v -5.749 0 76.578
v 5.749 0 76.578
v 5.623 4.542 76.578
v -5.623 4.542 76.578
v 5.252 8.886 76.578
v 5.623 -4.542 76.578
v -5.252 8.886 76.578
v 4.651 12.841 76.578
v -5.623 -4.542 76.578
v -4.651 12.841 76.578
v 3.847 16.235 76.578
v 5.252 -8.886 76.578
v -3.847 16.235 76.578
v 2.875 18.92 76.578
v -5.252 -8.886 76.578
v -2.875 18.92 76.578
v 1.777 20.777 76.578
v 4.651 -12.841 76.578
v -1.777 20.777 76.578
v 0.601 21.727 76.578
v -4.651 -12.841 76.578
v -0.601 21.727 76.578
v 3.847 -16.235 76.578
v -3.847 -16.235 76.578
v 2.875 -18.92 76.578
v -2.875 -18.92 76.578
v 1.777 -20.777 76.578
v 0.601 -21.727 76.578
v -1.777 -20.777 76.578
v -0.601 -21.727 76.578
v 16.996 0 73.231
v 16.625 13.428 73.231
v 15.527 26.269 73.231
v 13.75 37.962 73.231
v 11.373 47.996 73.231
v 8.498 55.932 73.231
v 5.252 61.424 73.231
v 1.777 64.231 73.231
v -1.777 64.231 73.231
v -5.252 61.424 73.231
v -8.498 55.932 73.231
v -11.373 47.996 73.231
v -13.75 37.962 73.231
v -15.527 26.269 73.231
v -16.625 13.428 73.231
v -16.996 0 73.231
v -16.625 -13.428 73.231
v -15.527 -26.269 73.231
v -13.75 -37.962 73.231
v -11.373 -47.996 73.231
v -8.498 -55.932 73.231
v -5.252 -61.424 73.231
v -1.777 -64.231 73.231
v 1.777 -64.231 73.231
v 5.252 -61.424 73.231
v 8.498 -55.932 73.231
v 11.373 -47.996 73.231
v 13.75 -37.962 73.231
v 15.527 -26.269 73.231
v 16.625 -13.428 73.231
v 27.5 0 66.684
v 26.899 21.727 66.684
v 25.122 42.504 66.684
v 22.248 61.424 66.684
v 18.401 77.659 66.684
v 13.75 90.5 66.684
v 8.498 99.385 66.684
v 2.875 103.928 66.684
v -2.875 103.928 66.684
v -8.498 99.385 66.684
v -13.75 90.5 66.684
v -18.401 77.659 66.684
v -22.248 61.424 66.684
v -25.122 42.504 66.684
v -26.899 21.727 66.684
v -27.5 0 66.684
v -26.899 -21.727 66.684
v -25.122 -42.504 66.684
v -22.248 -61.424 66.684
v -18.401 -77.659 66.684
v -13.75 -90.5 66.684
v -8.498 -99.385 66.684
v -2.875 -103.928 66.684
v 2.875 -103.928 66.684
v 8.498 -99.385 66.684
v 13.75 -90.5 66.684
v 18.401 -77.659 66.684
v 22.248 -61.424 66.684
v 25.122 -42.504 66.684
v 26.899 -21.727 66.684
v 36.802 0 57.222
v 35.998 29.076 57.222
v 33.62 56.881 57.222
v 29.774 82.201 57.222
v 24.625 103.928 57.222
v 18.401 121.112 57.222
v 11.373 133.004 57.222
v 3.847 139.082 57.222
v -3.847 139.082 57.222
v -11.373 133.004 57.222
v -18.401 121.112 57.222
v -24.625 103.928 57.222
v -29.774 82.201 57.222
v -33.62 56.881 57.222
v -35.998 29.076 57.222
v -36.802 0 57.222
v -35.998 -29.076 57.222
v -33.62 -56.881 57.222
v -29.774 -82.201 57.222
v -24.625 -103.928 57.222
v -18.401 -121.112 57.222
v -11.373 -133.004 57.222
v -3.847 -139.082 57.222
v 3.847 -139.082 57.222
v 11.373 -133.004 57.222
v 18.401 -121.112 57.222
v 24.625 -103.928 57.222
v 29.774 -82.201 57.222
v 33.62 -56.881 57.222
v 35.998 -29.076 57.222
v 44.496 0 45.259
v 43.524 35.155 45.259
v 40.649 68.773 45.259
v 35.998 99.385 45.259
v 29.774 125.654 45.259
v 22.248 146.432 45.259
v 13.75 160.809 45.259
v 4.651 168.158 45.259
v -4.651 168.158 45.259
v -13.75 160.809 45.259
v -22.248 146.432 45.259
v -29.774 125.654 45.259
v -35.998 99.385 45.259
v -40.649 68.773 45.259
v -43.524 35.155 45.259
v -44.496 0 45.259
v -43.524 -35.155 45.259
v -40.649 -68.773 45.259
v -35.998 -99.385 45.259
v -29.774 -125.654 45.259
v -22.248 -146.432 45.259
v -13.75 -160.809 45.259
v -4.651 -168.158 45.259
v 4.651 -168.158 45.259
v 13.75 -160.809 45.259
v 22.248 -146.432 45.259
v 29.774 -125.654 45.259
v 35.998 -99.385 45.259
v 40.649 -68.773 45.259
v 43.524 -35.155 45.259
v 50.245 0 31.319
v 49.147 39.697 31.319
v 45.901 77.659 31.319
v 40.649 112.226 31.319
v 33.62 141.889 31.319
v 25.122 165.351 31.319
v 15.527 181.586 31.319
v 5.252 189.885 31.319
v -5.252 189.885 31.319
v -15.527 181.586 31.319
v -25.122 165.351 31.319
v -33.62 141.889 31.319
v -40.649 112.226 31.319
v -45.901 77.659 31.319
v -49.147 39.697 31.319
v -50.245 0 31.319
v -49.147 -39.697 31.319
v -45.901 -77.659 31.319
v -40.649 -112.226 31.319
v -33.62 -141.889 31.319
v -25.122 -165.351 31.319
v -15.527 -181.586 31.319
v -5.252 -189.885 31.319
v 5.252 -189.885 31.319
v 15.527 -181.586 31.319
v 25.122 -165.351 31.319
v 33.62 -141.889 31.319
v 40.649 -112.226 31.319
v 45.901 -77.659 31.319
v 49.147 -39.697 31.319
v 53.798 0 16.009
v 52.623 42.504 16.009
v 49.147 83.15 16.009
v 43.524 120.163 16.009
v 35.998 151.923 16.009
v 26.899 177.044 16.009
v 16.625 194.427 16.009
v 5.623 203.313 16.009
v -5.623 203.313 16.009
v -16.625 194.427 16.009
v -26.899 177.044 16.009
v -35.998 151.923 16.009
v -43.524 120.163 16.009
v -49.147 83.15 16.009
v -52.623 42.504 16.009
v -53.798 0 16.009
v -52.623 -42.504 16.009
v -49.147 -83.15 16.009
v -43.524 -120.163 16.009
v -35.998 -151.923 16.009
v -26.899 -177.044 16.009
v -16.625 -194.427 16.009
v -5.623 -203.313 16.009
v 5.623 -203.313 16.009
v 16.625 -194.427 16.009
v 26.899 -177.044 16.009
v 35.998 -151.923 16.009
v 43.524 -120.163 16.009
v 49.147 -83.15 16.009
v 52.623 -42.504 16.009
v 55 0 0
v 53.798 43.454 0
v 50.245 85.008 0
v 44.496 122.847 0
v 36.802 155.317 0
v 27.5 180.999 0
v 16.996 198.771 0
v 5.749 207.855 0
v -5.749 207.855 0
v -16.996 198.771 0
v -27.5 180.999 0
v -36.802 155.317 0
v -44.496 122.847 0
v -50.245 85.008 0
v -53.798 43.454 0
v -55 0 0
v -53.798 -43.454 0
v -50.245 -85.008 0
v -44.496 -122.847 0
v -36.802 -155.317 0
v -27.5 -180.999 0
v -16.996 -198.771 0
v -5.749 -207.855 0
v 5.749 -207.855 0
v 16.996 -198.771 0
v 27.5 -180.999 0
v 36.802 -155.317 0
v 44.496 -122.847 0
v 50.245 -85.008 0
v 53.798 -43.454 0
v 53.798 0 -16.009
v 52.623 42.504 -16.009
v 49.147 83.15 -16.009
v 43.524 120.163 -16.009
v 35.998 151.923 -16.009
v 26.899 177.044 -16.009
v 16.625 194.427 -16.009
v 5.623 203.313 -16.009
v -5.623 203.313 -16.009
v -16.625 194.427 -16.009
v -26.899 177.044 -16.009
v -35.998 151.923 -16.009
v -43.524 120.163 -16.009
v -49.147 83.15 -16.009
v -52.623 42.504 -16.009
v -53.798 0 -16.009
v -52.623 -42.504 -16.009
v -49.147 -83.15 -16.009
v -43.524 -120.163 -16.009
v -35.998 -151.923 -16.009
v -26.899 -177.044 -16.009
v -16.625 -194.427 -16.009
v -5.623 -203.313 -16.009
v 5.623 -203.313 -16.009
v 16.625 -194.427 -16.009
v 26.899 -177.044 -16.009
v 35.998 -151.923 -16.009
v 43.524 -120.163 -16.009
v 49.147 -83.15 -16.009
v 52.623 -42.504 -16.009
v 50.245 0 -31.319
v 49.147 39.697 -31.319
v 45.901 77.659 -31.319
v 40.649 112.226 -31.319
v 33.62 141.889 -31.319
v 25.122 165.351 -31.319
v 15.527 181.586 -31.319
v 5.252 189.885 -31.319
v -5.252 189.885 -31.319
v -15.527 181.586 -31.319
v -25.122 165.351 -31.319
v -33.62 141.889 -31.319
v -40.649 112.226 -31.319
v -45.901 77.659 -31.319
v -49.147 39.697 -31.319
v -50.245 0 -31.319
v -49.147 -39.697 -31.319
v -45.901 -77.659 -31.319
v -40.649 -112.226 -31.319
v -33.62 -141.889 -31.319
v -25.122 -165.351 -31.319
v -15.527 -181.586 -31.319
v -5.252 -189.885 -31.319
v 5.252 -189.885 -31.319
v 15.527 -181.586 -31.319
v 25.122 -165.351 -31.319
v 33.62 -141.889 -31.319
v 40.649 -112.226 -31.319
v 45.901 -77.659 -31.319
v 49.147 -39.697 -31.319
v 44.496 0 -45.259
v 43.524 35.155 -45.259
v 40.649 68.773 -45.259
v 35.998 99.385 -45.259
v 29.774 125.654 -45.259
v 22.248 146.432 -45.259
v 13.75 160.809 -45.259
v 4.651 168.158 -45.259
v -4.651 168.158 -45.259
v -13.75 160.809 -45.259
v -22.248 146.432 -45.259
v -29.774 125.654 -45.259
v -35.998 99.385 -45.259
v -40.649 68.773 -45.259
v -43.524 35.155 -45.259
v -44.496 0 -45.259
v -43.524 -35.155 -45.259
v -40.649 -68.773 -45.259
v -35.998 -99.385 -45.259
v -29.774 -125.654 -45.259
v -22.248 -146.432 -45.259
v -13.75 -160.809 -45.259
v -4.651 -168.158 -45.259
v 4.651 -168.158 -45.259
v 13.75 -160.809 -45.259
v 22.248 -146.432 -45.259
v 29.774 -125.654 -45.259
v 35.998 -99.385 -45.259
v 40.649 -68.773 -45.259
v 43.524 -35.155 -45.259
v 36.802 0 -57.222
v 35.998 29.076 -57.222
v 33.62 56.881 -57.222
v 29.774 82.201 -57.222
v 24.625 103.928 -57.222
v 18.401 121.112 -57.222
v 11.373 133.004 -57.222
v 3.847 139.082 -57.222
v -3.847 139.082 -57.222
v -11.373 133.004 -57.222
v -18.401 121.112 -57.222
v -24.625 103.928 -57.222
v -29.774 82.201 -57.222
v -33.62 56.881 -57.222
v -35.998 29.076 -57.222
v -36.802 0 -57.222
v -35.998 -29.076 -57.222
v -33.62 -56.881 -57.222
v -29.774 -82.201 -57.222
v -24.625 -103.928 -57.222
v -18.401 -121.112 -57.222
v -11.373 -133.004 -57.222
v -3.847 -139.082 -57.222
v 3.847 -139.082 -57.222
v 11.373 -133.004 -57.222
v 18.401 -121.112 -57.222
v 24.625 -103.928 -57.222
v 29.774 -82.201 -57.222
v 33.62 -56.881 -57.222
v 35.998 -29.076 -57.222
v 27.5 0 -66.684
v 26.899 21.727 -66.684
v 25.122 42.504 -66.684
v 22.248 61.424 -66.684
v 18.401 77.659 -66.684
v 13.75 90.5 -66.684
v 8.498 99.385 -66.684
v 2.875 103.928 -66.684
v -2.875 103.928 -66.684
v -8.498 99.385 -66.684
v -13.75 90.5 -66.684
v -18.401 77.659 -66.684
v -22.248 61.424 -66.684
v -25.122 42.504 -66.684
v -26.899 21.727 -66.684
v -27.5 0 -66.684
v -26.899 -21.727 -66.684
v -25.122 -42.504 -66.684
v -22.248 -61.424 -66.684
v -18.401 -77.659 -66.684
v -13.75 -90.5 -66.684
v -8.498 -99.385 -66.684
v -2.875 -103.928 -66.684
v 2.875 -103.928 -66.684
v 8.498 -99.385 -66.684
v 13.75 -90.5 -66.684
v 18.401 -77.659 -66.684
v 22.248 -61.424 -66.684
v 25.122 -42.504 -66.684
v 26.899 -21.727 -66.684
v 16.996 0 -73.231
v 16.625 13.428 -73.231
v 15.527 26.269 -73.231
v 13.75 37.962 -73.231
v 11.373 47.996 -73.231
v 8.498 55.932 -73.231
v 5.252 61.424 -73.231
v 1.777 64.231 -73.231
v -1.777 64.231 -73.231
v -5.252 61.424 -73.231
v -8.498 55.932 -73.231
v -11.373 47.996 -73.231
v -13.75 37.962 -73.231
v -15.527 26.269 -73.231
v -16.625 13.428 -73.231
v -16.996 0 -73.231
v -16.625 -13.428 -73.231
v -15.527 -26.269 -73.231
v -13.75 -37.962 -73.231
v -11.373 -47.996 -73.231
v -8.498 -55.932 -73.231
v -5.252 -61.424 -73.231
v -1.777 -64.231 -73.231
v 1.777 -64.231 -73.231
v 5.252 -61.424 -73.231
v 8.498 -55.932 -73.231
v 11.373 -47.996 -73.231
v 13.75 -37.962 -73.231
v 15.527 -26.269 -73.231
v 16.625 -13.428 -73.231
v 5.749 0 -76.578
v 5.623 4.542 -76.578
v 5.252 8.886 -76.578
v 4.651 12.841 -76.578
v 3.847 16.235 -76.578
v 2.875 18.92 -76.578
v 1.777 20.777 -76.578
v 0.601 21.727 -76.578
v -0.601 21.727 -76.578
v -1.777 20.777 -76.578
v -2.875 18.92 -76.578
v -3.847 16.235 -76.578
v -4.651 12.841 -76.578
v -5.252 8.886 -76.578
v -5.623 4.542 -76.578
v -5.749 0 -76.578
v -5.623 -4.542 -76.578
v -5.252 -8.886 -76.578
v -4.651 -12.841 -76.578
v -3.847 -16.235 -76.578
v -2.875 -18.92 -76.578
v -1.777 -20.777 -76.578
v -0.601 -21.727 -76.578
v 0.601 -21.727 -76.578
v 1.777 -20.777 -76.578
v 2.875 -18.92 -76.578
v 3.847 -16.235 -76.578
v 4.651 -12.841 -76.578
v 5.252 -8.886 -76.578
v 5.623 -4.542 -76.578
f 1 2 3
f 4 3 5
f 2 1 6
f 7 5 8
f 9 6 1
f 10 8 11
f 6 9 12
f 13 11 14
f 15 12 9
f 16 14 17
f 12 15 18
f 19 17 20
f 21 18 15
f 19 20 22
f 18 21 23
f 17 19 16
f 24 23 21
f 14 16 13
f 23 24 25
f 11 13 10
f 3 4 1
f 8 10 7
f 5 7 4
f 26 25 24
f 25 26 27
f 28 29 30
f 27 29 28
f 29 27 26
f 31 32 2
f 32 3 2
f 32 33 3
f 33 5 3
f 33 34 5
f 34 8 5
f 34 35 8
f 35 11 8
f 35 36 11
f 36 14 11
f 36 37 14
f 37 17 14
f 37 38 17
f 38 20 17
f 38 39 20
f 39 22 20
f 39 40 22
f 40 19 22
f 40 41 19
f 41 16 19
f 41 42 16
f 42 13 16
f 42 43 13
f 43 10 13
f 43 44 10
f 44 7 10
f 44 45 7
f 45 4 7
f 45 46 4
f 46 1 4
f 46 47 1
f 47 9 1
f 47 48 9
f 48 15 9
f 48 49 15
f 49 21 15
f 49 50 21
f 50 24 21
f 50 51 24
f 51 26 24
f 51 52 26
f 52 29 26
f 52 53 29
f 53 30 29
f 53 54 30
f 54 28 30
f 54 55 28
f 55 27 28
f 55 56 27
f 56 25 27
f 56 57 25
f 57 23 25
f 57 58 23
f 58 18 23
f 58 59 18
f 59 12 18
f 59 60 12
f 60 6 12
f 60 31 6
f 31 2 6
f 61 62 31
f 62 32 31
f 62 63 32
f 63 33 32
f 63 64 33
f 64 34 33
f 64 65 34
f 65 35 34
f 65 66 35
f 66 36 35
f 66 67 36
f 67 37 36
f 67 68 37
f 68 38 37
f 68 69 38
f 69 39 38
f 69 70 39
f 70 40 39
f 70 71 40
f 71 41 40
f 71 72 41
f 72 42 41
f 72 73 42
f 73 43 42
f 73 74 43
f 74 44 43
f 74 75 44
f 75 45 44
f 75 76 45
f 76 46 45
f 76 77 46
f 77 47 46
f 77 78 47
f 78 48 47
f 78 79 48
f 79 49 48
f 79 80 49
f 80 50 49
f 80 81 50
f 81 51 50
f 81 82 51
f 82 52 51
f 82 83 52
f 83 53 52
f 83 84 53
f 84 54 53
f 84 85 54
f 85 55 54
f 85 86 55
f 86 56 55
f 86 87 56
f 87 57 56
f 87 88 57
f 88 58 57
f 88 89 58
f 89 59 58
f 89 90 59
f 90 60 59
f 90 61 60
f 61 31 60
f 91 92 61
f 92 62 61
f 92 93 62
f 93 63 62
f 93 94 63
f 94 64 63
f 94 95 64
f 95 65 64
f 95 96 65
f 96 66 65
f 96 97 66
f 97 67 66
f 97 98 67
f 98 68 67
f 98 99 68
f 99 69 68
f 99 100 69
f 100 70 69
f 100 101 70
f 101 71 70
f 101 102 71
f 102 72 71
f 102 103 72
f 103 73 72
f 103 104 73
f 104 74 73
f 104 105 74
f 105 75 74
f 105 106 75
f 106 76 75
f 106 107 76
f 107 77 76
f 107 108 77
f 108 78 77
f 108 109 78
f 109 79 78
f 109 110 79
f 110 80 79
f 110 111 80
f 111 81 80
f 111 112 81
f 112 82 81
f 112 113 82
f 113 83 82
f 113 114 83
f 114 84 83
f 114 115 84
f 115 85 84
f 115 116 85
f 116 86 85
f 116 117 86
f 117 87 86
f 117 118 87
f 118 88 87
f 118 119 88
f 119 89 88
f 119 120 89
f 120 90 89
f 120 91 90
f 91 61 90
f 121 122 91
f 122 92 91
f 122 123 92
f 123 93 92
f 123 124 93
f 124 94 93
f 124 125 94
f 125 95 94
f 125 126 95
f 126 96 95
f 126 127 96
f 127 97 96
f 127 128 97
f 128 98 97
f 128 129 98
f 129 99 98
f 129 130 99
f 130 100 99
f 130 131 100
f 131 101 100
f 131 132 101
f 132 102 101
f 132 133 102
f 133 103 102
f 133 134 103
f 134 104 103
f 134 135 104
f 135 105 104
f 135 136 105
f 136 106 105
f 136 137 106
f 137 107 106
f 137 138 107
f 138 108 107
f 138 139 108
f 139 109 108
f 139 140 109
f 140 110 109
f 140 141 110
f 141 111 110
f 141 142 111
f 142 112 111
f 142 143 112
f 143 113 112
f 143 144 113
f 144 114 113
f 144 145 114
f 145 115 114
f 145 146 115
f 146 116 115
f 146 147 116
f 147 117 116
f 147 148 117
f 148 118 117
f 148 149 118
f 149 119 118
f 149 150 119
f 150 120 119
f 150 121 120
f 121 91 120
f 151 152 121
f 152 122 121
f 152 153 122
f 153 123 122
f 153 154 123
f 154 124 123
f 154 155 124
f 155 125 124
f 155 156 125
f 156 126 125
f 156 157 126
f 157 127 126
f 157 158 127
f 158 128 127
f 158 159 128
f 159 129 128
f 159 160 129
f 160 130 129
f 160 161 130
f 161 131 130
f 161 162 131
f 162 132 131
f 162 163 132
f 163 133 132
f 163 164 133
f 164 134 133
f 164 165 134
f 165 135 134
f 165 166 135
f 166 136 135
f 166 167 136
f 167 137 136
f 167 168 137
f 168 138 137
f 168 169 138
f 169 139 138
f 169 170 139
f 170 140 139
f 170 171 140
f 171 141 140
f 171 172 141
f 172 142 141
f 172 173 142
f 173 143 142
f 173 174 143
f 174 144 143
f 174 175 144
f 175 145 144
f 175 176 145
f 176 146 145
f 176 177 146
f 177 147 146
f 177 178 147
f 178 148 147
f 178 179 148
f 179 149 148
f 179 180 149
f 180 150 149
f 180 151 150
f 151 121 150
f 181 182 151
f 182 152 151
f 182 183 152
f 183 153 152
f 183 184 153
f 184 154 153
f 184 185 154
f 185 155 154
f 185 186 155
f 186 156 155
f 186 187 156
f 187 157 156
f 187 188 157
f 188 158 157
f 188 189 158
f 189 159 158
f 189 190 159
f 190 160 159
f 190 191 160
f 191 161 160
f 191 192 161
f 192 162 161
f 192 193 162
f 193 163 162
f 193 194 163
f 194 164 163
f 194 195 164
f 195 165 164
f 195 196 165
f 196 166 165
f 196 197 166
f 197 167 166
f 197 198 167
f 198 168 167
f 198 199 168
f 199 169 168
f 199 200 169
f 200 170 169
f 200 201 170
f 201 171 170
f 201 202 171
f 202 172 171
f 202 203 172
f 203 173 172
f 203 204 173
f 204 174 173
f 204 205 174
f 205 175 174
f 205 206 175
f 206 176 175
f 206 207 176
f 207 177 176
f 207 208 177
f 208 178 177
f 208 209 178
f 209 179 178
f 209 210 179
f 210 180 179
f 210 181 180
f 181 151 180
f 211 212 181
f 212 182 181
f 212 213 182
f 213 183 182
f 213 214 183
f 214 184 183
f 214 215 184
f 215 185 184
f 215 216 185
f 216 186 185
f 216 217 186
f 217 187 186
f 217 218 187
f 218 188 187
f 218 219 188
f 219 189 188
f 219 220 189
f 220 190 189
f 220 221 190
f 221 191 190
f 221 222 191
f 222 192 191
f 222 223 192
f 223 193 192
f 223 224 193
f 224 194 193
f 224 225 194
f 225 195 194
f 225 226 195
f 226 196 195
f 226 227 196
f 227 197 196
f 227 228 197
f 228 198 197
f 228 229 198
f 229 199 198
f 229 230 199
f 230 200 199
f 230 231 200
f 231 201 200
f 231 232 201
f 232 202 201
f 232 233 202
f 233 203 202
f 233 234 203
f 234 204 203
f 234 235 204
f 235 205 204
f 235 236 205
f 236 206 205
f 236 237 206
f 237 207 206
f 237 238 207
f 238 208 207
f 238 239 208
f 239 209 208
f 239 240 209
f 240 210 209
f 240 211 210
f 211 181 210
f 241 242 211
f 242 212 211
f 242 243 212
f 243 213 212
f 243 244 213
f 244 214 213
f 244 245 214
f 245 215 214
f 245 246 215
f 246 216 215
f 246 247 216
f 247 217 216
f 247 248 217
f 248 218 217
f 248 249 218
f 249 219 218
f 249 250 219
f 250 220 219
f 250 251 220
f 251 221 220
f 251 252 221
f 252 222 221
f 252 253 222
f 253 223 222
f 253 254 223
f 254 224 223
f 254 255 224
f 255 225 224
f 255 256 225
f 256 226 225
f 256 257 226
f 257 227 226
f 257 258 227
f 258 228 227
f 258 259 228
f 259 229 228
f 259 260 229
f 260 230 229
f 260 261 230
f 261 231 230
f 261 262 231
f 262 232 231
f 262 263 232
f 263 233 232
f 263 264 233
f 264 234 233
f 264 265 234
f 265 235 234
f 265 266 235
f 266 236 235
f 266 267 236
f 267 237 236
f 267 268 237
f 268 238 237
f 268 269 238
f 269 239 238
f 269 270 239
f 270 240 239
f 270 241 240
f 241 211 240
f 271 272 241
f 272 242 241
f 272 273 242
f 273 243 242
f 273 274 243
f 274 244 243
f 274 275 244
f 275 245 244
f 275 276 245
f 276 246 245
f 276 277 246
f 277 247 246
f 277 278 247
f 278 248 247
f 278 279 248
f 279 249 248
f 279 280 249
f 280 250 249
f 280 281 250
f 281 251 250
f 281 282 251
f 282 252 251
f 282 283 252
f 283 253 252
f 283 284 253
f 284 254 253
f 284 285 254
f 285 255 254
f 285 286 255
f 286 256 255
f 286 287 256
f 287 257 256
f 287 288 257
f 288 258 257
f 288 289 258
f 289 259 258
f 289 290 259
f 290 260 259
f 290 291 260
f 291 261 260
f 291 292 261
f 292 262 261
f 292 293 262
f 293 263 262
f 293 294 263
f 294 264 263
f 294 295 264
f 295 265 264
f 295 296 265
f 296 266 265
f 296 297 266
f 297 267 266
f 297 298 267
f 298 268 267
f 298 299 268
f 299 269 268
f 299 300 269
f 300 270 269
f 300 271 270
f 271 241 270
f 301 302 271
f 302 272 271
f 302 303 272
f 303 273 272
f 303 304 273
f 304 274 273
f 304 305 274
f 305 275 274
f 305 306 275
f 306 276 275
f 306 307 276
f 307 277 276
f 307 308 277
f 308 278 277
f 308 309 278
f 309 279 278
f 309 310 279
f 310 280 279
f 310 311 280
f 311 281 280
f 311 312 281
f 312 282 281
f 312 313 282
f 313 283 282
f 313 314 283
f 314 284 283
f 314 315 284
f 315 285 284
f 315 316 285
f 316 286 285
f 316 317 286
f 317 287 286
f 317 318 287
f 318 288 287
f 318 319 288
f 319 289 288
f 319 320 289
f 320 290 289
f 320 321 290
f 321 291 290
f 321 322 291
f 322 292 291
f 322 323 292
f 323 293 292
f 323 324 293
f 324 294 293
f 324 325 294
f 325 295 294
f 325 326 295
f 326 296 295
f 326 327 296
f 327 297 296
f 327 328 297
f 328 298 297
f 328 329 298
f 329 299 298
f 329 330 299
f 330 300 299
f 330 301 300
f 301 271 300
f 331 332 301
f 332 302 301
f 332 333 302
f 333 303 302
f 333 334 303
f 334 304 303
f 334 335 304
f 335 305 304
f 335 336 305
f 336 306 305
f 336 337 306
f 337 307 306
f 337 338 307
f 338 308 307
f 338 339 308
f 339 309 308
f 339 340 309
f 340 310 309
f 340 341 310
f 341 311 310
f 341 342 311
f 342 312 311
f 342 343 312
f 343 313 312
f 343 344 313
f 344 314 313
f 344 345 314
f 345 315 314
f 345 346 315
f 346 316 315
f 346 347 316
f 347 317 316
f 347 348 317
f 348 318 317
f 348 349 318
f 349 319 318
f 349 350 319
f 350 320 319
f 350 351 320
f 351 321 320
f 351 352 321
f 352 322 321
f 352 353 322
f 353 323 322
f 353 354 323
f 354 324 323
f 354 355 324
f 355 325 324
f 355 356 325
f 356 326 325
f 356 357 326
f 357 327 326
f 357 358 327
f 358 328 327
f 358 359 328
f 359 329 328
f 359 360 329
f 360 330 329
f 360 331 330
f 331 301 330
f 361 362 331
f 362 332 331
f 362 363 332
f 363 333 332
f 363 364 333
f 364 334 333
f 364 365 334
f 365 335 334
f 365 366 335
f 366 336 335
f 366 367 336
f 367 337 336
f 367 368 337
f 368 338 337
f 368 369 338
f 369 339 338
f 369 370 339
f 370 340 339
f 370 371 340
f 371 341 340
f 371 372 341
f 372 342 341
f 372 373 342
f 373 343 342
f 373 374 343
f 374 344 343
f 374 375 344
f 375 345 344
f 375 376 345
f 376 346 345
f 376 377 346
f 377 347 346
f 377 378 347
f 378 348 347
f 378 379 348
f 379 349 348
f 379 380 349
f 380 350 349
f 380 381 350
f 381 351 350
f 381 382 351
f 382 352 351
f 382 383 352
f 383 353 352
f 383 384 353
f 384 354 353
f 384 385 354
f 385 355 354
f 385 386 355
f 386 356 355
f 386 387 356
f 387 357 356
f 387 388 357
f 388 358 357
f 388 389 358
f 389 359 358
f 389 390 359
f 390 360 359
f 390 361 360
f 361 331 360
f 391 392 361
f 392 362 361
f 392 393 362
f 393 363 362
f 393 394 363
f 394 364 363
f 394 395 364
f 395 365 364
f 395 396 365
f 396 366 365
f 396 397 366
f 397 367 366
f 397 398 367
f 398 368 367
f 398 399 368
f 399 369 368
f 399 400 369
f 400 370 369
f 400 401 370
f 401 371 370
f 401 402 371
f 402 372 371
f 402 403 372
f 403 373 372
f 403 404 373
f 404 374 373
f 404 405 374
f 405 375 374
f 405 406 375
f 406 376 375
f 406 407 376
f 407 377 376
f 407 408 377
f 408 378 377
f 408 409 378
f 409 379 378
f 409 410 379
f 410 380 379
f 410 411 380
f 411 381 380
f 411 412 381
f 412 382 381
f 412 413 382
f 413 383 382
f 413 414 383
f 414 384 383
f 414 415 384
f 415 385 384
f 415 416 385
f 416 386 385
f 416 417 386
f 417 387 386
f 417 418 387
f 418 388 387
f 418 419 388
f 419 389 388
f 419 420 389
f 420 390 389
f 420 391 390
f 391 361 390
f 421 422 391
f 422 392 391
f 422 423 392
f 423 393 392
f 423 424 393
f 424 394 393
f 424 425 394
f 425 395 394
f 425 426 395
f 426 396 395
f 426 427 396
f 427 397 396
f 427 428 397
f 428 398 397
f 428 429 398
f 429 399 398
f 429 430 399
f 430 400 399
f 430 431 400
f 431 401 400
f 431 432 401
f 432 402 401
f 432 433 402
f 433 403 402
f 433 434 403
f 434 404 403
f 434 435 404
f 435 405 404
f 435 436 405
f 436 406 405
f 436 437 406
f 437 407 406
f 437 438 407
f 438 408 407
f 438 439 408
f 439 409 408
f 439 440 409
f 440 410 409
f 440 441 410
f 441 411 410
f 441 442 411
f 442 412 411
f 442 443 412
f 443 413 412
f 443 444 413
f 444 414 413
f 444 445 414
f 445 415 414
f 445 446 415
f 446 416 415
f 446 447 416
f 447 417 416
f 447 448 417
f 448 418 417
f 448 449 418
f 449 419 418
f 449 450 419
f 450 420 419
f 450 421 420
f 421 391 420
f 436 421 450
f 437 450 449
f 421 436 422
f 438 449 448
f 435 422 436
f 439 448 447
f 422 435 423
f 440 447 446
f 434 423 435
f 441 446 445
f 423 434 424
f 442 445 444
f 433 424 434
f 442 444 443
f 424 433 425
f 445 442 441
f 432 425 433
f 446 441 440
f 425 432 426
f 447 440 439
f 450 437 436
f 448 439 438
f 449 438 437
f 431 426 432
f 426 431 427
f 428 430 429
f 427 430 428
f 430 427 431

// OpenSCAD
// Generated by SolidPython 1.0.1 on 2020-07-29 00:46:47


scale(v = [5, 19, 7]) {
	sphere(r = 11);
}
/***********************************************
*********      SolidPython code:      **********
************************************************
 
# import packages: SolidPython
from solid import *
from solid.utils import *
from itertools import chain, combinations, permutations


class Resize:

    def __init__(self, scad_file):
        self.scad_file = scad_file
        #self.scad_file = import_scad(scad_file)
        # cone/cylinder param:
        self.r1 = 0
        self.r2 = 0
        self.h = 0
        # rectangular prism param:
        self.w = 0
        self.l = 0
        # ellipse param:
        self.r = 0

    # import OpenScad code (file name corresponds to shape)


    # classify shape + parameters
    def assign(self, param1, param2, param3):
        if self.scad_file == 'cone.scad':
            self.r1 = param1
            self.r2 = param2
            self.h = param3
        elif self.scad_file == 'cylinder.scad':
            self.r1 = param1
            self.r2 = param2
            self.h = param3
        elif self.scad_file == 'rectangularPrism.scad':
            self.h = param1
            self.l = param2
            self.w = param3
        else:
            self.r = param1
            self.h = param2

    # resize parameters
    def iterate(self):
        x = range(3, 20, 2)
        i = 1
        if self.scad_file == 'cone.scad':
            tempList = list(permutations(x, 2))
            for temp in tempList:
                param1 = temp[0]
                param2 = temp[1]
                filepath = 'produced_scad_files/' + 'cone' + str(param1) + '_' + str(param2) + '_' + '.scad'
                scad_render_to_file(cylinder(h=param1, r1=param2, r2=0), filepath)

        elif self.scad_file == 'cylinder.scad':
            tempList = list(permutations(x, 3))
            for temp in tempList:
                param1 = temp[0]
                param2 = temp[1]
                filepath = 'produced_scad_files/' + 'cylinder' + str(param1) + '_' + str(param2) + '_' + '.scad'
                scad_render_to_file(cylinder(h=param1, r1=param2, r2=param2), filepath)

        elif self.scad_file == 'rectangularPrism.scad':
            tempList = list(permutations(x, 3))
            for temp in tempList:
                param1 = temp[0]
                param2 = temp[1]
                param3 = temp[2]
                filepath = 'produced_scad_files/' + 'rectangularPrism' + str(param1) + '_' + str(param2) + '_' + str(
                    param3) + '.scad'
                scad_render_to_file(cube(size=(param1, param2, param3)), filepath)

        elif self.scad_file == 'ellipse.scad':
            tempList = list(permutations(x, 4))
            for temp in tempList:
                param1 = temp[0]
                param2 = temp[1]
                param3 = temp[2]
                param4 = temp[3]
                filepath = 'produced_scad_files/' + 'ellipse' + str(param1) + '_' + str(param2) + '_' + str(param3) + '_' + str(param4) + '.scad'
                scad_render_to_file(scale([param1, param2, param3])(sphere(r=param4)), filepath)

    def render_to_scadfile(self):
        scad_render_to_file(scad, 'example.scad') 
 
************************************************/
